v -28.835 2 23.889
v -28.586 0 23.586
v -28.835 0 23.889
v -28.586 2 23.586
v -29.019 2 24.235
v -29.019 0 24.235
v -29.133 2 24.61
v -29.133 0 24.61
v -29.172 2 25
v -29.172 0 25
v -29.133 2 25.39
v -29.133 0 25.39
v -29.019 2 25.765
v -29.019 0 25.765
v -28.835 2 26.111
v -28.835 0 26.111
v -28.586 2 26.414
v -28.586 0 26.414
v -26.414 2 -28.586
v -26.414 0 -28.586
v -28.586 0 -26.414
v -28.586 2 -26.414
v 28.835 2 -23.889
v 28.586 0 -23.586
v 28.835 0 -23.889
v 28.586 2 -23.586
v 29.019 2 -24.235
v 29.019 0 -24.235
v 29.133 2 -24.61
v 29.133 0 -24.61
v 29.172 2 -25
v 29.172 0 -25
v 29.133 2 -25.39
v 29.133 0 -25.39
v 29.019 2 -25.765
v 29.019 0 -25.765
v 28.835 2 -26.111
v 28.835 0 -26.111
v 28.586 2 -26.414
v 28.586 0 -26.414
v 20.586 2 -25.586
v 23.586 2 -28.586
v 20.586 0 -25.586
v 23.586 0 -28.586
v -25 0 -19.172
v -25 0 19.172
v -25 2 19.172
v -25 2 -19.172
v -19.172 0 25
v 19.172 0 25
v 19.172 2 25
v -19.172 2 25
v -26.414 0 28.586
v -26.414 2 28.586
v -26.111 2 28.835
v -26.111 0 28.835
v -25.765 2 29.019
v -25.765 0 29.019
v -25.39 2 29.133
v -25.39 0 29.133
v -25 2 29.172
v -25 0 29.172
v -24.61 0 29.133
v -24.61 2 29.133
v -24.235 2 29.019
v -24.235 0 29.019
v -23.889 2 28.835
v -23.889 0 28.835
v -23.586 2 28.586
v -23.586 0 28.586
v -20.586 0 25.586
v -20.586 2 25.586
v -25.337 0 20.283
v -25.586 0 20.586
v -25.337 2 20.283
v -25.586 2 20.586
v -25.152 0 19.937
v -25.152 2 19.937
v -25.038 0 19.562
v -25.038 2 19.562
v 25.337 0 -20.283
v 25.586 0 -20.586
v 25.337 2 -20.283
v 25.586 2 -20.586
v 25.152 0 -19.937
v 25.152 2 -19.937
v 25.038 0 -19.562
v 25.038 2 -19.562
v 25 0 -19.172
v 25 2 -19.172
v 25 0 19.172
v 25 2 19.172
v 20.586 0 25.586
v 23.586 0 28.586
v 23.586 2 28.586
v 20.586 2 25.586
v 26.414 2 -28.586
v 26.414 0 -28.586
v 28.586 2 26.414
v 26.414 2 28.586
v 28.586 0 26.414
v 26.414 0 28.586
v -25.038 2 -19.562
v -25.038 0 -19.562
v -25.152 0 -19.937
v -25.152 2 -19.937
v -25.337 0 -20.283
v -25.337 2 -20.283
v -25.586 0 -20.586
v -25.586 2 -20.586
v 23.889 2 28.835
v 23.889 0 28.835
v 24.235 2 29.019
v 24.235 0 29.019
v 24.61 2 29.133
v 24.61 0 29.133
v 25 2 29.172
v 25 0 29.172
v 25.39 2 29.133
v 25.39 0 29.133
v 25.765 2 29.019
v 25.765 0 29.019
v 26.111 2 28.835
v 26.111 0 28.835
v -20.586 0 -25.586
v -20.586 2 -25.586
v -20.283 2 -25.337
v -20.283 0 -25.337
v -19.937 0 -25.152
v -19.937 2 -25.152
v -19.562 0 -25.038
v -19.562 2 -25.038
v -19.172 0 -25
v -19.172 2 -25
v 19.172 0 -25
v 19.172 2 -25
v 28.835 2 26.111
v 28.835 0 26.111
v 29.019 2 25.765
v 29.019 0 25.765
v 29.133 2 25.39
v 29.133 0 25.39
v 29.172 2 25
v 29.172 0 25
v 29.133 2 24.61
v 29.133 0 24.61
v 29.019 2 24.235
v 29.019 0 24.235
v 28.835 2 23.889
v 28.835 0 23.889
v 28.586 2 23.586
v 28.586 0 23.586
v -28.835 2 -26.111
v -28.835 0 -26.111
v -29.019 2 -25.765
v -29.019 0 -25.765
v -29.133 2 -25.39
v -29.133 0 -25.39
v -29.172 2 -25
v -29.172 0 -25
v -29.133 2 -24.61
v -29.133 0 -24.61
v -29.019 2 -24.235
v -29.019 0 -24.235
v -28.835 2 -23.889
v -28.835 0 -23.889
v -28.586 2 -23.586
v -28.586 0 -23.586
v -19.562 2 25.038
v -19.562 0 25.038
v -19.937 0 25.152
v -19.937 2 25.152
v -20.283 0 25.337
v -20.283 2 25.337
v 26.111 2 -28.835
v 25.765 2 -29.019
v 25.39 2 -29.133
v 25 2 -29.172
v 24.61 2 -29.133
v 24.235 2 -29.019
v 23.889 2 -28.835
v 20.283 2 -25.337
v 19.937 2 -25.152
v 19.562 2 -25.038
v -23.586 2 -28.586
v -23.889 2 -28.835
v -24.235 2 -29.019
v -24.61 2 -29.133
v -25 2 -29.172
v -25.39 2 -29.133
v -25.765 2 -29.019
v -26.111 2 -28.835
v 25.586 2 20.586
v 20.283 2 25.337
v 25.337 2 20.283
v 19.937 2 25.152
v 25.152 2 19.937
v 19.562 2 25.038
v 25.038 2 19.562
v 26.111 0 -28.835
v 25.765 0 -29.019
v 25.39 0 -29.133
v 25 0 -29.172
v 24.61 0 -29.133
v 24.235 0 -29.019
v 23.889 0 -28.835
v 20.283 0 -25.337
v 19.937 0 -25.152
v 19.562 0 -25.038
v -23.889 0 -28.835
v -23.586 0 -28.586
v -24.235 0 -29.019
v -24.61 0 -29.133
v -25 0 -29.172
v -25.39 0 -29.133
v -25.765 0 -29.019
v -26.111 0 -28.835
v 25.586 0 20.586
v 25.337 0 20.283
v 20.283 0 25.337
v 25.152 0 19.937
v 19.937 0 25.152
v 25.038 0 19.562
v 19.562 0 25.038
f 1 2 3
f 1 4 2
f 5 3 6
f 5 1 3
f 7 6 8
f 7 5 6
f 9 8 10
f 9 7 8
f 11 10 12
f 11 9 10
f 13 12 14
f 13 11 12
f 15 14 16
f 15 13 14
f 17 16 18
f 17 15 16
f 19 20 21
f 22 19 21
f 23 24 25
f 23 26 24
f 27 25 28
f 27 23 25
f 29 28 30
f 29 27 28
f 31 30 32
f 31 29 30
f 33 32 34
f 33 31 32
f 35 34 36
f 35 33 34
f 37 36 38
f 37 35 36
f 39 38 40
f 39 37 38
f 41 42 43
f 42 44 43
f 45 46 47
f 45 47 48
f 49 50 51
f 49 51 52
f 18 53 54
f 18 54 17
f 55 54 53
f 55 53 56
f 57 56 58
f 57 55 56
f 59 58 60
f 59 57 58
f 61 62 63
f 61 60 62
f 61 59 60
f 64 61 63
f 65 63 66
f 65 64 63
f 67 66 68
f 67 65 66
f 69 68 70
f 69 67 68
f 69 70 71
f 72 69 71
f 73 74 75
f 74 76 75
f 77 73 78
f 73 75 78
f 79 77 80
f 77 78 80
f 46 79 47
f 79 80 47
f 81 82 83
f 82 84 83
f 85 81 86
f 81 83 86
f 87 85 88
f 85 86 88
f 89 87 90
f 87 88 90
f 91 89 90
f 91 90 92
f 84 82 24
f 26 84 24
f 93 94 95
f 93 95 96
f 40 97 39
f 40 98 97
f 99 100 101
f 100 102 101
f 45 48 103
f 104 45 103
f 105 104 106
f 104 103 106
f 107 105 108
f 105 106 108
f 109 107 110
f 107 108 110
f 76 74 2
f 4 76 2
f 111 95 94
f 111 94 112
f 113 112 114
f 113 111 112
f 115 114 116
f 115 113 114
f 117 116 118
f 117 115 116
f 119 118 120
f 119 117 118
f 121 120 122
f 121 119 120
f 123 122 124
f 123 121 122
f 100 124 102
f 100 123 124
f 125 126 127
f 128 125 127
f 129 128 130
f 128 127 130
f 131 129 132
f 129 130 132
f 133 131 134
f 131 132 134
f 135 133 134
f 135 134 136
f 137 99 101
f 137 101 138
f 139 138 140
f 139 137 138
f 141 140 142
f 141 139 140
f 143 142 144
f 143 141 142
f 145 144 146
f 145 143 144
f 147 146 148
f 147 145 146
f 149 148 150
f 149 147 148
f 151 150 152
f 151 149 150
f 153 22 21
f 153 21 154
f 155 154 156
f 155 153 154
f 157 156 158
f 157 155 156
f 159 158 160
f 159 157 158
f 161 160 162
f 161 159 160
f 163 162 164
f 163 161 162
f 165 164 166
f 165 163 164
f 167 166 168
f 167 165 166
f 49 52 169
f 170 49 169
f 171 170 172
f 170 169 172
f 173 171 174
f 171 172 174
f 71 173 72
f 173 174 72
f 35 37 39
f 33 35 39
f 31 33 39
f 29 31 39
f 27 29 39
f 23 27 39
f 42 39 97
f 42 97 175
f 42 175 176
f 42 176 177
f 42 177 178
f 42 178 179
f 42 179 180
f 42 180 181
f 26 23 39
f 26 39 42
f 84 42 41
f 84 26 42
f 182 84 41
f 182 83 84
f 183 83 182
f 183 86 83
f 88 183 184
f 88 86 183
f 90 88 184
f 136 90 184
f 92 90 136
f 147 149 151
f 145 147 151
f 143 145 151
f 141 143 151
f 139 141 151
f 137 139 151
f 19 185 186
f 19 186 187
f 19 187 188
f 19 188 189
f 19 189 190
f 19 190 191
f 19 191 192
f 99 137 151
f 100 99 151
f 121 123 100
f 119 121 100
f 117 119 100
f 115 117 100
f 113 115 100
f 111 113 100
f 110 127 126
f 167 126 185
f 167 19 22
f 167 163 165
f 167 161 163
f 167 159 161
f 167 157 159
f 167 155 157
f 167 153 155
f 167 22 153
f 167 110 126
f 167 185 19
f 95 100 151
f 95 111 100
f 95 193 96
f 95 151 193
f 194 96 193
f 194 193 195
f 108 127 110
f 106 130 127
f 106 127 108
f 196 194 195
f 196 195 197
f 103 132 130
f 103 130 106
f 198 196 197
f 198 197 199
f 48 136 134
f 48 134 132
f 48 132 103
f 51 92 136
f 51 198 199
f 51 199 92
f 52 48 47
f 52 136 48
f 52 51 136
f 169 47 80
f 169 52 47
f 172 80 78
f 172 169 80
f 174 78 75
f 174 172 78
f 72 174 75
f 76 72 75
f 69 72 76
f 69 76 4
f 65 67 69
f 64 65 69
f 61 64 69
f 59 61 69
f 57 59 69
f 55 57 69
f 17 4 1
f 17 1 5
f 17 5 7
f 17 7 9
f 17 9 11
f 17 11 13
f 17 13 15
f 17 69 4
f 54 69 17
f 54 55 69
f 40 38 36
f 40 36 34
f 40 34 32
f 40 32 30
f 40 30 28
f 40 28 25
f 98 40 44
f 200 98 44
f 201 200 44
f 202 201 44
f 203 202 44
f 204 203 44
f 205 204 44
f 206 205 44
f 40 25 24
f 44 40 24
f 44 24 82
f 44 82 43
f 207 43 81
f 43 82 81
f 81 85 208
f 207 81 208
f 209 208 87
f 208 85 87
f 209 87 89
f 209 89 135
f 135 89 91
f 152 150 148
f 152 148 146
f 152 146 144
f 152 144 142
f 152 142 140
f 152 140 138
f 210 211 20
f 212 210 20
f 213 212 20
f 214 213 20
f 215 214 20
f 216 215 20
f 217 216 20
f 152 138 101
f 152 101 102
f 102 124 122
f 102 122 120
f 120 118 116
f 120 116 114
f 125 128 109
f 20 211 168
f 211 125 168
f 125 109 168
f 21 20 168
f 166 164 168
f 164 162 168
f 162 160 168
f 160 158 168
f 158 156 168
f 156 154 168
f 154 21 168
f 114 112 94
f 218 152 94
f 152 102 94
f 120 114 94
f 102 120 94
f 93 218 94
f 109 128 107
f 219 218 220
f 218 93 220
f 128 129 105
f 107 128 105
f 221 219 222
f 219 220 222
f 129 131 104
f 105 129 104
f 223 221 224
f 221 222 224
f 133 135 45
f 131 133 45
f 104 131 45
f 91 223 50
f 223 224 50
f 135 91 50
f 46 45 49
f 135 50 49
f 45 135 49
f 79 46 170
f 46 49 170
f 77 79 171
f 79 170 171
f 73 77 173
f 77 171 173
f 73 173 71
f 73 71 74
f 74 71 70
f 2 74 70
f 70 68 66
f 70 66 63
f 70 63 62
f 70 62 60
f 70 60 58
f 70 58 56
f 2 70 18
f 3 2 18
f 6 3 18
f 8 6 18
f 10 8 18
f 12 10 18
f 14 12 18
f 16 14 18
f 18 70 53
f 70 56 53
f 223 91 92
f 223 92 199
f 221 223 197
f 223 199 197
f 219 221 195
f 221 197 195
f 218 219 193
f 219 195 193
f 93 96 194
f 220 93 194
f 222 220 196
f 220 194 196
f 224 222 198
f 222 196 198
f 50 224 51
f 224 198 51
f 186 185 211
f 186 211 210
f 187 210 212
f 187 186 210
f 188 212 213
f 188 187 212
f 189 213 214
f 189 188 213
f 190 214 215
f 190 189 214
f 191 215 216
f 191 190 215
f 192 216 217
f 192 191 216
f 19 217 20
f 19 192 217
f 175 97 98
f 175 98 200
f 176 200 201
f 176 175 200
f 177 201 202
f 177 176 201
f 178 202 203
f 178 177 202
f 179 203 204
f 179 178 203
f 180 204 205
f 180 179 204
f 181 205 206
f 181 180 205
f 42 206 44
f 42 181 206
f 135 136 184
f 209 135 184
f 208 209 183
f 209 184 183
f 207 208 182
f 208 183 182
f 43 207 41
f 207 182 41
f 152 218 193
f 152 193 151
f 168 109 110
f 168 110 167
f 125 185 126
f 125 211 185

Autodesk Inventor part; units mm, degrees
ref_plane "YZ Plane" through (0, 0, 0) normal (1, 0, 0) x (0, 1, 0)
ref_plane "XZ Plane" through (0, 0, 0) normal (0, 1, 0) x (-1, 0, 0)
ref_plane "XY Plane" through (0, 0, 0) normal (0, 0, 1) x (1, 0, 0)
sketch "Sketch1" plane through (0, 0, 0) normal (0, 1, 0) x (-1, 0, 0)
  line L0 (-25, 25) -> (25, 25)
  line L1 (25, 25) -> (25, -25)
  line L2 (25, -25) -> (-25, -25)
  line L3 (-25, -25) -> (-25, 25)
  line L4 (-25, 25) -> (25, -25) construction
  line L5 (25, 25) -> (-25, -25) construction
  line L6 (-30, 30) -> (30, 30) construction
  line L7 (30, 30) -> (30, -30) construction
  line L8 (30, -30) -> (-30, -30) construction
  line L9 (-30, -30) -> (-30, 30) construction
  line L10 (-30, 30) -> (30, -30) construction
  line L11 (30, 30) -> (-30, -30) construction
  line L12 (-25, 30) -> (-30, 25)
  line L13 (-30, 25) -> (-25, 30)
  line L14 (-25, 30) -> (-20, 25)
  line L15 (-20, 25) -> (-25, 20)
  line L16 (-25, 20) -> (-30, 25)
  line L17 (0, 0) -> (0, 2.49) construction
  line L18 (0, 0) -> (2.0714, 0) construction
  line L19 (25, 30) -> (30, 25)
  line L20 (25, 30) -> (20, 25)
  line L21 (20, 25) -> (25, 20)
  line L22 (25, 20) -> (30, 25)
  line L23 (-25, -30) -> (-30, -25)
  line L24 (-25, -30) -> (-20, -25)
  line L25 (-20, -25) -> (-25, -20)
  line L26 (-25, -20) -> (-30, -25)
  line L27 (25, -30) -> (20, -25)
  line L28 (25, -20) -> (30, -25)
  line L29 (25, -30) -> (30, -25)
  line L30 (20, -25) -> (25, -20)
  dimension "d0" = 50
  dimension "d1" = 50
  dimension "d2" = 60
  dimension "d3" = 60
  dimension "d4" = 5
  dimension "d5" = 5
extrude "Extrusion1" add sketch "Sketch1" along normal blind 2
fillet "Fillet1" radius 2 16 edges at (30, 1, 25) (25, 1, 30) (25, 1, 20) (25, 1, -20) (30, 1, -25) (25, 1, -30) (20, 1, -25) (-20, 1, -25) (-25, 1, -30) (-30, 1, -25) (-25, 1, -20) (-25, 1, 20) (-20, 1, 25) (-30, 1, 25) (-25, 1, 30) (20, 1, 25)
properties part number "drone"
